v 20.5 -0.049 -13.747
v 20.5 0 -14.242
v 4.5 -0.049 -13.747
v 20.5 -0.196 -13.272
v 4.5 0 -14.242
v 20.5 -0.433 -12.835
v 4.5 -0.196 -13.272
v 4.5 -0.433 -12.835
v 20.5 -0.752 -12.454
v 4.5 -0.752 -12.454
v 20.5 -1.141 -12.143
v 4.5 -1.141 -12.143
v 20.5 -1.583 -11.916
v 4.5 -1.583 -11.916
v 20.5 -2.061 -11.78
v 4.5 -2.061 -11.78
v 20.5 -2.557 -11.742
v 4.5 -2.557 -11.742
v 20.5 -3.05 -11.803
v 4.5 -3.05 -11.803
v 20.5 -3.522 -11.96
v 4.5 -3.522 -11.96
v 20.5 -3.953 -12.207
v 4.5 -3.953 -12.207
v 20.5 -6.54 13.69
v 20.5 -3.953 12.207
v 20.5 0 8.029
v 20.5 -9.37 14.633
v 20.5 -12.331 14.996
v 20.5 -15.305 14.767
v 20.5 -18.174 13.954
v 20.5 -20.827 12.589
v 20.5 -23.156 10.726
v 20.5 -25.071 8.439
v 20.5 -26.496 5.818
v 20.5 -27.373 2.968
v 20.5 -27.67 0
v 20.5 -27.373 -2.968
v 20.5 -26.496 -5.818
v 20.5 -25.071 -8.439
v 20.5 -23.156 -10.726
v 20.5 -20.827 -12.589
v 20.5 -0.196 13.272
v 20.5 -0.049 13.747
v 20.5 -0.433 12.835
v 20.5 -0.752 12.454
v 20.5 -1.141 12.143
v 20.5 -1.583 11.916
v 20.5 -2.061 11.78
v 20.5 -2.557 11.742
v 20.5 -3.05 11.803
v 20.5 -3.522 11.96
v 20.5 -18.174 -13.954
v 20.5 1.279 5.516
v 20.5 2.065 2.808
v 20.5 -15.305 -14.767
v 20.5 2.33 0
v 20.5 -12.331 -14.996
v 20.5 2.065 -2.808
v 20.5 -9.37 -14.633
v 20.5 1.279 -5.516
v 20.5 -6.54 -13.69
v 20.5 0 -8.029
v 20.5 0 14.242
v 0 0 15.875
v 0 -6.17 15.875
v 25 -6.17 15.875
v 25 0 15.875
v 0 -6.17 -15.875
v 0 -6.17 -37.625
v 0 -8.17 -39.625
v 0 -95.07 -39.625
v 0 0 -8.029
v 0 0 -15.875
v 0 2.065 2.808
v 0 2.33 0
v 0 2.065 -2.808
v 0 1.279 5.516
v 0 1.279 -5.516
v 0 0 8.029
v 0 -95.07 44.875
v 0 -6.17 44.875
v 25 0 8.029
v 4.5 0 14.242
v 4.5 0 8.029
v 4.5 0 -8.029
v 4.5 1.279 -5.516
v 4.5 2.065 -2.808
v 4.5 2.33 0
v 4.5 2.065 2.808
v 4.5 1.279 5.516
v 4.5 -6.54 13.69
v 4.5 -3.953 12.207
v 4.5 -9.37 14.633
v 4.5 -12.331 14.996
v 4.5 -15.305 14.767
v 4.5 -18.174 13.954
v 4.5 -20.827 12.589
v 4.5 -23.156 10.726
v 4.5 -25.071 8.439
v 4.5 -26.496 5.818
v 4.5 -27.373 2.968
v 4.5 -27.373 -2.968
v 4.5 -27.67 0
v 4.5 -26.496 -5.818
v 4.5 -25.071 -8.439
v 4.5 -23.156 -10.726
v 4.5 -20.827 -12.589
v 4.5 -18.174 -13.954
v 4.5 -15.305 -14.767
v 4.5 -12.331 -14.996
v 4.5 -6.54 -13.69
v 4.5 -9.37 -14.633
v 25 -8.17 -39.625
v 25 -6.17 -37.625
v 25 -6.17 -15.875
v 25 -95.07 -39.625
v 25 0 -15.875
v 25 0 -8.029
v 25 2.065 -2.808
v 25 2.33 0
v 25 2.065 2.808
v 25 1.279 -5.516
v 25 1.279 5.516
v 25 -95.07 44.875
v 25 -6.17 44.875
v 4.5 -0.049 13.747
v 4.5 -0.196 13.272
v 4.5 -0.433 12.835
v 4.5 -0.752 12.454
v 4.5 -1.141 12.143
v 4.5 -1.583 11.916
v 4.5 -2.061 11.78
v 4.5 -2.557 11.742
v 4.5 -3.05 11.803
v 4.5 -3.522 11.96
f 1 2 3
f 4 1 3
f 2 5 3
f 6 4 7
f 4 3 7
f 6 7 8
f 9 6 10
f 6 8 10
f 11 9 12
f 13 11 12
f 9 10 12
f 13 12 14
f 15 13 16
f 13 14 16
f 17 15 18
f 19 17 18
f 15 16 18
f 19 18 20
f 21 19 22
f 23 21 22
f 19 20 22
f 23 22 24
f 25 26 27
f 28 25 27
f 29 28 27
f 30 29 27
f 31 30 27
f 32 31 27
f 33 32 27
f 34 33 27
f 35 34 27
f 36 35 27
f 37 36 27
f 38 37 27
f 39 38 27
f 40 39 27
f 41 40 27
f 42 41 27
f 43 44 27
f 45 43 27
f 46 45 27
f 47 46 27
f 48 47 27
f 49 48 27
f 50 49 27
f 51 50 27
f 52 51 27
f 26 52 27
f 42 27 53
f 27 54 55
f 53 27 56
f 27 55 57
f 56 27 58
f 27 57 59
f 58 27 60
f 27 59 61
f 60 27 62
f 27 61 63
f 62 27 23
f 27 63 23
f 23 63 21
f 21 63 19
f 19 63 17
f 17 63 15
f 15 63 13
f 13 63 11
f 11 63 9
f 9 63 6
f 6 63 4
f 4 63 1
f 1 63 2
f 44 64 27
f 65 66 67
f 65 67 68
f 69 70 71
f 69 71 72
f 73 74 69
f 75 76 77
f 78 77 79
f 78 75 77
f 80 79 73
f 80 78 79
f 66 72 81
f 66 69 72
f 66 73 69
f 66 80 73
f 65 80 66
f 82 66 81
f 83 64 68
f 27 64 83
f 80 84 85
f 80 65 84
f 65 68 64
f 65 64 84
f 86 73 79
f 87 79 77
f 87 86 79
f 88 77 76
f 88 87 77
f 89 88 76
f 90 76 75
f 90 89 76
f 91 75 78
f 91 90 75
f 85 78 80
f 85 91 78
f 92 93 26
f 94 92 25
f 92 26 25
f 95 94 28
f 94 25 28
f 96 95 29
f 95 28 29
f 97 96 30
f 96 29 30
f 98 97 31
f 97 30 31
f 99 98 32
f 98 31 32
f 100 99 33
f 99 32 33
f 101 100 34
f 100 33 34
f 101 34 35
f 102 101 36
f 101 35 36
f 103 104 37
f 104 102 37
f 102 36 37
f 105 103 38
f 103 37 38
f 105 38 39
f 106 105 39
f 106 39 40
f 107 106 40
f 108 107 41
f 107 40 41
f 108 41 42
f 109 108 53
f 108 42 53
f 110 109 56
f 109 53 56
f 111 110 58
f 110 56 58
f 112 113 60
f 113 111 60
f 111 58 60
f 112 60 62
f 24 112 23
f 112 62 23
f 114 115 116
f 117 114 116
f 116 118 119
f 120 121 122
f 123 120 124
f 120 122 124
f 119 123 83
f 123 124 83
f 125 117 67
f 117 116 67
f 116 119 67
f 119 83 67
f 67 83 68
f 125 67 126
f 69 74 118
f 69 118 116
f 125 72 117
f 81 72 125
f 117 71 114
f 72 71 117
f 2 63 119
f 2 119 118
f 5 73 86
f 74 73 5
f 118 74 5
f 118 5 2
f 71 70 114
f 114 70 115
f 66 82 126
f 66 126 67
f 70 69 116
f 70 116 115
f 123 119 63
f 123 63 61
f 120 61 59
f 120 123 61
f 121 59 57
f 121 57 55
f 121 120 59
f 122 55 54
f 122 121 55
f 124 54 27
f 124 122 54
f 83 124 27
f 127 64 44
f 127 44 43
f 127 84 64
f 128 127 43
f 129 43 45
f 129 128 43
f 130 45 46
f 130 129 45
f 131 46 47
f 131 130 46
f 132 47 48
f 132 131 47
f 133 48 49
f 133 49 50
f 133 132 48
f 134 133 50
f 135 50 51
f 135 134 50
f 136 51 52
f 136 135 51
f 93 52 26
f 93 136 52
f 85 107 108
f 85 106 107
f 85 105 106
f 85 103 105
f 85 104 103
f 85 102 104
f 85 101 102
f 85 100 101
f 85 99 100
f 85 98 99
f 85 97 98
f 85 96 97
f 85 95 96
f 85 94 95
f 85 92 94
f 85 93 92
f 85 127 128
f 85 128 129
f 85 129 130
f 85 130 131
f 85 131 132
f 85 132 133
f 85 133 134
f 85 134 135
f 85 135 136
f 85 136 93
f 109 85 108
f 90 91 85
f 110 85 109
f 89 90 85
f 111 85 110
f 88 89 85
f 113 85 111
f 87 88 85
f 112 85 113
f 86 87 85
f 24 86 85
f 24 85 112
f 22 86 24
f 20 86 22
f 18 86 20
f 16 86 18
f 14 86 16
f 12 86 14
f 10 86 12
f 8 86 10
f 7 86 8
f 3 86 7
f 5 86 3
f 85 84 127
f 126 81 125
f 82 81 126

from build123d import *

# Parameters (mm, degrees)
BOSS_EXTRUDE1_DEPTH = 25
BOSS_EXTRUDE2_DEPTH = 25
CUT_EXTRUDE1_START  = -4.5
SKETCH3_R           = 15
CUT_EXTRUDE1_DEPTH  = 16
CHAMFER1_SIZE       = 2
FILLET2_R           = 2.5


with BuildPart() as part:
    # Sketch1 → Boss-Extrude1 (new body)
    with BuildSketch(Plane(origin=(0, 0, 0), x_dir=(0, 0, -1), z_dir=(1, 0, 0))):
        Polygon((-44.875, -95.07), (-44.875, -6.17), (-15.875, -6.17), (-15.875, 0), (15.875, 0), (15.875, -6.17), (39.625, -6.17), (39.625, -95.07), align=None)
    extrude(amount=BOSS_EXTRUDE1_DEPTH)

    # Sketch2 → Boss-Extrude2 (add)
    with BuildSketch(Plane(origin=(25, 0, 0), x_dir=(0, 0, -1), z_dir=(1, 0, 0))):
        with BuildLine():
            Line((-8.029389765, 0), (8.029389765, 0))
            ThreePointArc((8.029389765, 0), (0, 2.33), (-8.029389765, 0))
        make_face()
    extrude(amount=-BOSS_EXTRUDE2_DEPTH)

    # Sketch3 → Cut-Extrude1 (cut)
    with BuildSketch(Plane(origin=(25, 0, 0), x_dir=(0, 0, -1), z_dir=(1, 0, 0)).offset(CUT_EXTRUDE1_START)):
        with Locations((0, -12.67)):
            Circle(SKETCH3_R)
    extrude(amount=-CUT_EXTRUDE1_DEPTH, mode=Mode.SUBTRACT)

    # Chamfer1
    chamfer1_edges = [part.edges().sort_by_distance(p)[0] for p in [
        (12.5, -6.17, -39.625),
    ]]
    chamfer(chamfer1_edges, length=CHAMFER1_SIZE)

    # Fillet2
    fillet2_edges = [part.edges().sort_by_distance(p)[0] for p in [
        (12.5, 0, -8.029389765),
        (12.5, 0, 8.029389765),
    ]]
    fillet(fillet2_edges, radius=FILLET2_R)


solid = part.part
